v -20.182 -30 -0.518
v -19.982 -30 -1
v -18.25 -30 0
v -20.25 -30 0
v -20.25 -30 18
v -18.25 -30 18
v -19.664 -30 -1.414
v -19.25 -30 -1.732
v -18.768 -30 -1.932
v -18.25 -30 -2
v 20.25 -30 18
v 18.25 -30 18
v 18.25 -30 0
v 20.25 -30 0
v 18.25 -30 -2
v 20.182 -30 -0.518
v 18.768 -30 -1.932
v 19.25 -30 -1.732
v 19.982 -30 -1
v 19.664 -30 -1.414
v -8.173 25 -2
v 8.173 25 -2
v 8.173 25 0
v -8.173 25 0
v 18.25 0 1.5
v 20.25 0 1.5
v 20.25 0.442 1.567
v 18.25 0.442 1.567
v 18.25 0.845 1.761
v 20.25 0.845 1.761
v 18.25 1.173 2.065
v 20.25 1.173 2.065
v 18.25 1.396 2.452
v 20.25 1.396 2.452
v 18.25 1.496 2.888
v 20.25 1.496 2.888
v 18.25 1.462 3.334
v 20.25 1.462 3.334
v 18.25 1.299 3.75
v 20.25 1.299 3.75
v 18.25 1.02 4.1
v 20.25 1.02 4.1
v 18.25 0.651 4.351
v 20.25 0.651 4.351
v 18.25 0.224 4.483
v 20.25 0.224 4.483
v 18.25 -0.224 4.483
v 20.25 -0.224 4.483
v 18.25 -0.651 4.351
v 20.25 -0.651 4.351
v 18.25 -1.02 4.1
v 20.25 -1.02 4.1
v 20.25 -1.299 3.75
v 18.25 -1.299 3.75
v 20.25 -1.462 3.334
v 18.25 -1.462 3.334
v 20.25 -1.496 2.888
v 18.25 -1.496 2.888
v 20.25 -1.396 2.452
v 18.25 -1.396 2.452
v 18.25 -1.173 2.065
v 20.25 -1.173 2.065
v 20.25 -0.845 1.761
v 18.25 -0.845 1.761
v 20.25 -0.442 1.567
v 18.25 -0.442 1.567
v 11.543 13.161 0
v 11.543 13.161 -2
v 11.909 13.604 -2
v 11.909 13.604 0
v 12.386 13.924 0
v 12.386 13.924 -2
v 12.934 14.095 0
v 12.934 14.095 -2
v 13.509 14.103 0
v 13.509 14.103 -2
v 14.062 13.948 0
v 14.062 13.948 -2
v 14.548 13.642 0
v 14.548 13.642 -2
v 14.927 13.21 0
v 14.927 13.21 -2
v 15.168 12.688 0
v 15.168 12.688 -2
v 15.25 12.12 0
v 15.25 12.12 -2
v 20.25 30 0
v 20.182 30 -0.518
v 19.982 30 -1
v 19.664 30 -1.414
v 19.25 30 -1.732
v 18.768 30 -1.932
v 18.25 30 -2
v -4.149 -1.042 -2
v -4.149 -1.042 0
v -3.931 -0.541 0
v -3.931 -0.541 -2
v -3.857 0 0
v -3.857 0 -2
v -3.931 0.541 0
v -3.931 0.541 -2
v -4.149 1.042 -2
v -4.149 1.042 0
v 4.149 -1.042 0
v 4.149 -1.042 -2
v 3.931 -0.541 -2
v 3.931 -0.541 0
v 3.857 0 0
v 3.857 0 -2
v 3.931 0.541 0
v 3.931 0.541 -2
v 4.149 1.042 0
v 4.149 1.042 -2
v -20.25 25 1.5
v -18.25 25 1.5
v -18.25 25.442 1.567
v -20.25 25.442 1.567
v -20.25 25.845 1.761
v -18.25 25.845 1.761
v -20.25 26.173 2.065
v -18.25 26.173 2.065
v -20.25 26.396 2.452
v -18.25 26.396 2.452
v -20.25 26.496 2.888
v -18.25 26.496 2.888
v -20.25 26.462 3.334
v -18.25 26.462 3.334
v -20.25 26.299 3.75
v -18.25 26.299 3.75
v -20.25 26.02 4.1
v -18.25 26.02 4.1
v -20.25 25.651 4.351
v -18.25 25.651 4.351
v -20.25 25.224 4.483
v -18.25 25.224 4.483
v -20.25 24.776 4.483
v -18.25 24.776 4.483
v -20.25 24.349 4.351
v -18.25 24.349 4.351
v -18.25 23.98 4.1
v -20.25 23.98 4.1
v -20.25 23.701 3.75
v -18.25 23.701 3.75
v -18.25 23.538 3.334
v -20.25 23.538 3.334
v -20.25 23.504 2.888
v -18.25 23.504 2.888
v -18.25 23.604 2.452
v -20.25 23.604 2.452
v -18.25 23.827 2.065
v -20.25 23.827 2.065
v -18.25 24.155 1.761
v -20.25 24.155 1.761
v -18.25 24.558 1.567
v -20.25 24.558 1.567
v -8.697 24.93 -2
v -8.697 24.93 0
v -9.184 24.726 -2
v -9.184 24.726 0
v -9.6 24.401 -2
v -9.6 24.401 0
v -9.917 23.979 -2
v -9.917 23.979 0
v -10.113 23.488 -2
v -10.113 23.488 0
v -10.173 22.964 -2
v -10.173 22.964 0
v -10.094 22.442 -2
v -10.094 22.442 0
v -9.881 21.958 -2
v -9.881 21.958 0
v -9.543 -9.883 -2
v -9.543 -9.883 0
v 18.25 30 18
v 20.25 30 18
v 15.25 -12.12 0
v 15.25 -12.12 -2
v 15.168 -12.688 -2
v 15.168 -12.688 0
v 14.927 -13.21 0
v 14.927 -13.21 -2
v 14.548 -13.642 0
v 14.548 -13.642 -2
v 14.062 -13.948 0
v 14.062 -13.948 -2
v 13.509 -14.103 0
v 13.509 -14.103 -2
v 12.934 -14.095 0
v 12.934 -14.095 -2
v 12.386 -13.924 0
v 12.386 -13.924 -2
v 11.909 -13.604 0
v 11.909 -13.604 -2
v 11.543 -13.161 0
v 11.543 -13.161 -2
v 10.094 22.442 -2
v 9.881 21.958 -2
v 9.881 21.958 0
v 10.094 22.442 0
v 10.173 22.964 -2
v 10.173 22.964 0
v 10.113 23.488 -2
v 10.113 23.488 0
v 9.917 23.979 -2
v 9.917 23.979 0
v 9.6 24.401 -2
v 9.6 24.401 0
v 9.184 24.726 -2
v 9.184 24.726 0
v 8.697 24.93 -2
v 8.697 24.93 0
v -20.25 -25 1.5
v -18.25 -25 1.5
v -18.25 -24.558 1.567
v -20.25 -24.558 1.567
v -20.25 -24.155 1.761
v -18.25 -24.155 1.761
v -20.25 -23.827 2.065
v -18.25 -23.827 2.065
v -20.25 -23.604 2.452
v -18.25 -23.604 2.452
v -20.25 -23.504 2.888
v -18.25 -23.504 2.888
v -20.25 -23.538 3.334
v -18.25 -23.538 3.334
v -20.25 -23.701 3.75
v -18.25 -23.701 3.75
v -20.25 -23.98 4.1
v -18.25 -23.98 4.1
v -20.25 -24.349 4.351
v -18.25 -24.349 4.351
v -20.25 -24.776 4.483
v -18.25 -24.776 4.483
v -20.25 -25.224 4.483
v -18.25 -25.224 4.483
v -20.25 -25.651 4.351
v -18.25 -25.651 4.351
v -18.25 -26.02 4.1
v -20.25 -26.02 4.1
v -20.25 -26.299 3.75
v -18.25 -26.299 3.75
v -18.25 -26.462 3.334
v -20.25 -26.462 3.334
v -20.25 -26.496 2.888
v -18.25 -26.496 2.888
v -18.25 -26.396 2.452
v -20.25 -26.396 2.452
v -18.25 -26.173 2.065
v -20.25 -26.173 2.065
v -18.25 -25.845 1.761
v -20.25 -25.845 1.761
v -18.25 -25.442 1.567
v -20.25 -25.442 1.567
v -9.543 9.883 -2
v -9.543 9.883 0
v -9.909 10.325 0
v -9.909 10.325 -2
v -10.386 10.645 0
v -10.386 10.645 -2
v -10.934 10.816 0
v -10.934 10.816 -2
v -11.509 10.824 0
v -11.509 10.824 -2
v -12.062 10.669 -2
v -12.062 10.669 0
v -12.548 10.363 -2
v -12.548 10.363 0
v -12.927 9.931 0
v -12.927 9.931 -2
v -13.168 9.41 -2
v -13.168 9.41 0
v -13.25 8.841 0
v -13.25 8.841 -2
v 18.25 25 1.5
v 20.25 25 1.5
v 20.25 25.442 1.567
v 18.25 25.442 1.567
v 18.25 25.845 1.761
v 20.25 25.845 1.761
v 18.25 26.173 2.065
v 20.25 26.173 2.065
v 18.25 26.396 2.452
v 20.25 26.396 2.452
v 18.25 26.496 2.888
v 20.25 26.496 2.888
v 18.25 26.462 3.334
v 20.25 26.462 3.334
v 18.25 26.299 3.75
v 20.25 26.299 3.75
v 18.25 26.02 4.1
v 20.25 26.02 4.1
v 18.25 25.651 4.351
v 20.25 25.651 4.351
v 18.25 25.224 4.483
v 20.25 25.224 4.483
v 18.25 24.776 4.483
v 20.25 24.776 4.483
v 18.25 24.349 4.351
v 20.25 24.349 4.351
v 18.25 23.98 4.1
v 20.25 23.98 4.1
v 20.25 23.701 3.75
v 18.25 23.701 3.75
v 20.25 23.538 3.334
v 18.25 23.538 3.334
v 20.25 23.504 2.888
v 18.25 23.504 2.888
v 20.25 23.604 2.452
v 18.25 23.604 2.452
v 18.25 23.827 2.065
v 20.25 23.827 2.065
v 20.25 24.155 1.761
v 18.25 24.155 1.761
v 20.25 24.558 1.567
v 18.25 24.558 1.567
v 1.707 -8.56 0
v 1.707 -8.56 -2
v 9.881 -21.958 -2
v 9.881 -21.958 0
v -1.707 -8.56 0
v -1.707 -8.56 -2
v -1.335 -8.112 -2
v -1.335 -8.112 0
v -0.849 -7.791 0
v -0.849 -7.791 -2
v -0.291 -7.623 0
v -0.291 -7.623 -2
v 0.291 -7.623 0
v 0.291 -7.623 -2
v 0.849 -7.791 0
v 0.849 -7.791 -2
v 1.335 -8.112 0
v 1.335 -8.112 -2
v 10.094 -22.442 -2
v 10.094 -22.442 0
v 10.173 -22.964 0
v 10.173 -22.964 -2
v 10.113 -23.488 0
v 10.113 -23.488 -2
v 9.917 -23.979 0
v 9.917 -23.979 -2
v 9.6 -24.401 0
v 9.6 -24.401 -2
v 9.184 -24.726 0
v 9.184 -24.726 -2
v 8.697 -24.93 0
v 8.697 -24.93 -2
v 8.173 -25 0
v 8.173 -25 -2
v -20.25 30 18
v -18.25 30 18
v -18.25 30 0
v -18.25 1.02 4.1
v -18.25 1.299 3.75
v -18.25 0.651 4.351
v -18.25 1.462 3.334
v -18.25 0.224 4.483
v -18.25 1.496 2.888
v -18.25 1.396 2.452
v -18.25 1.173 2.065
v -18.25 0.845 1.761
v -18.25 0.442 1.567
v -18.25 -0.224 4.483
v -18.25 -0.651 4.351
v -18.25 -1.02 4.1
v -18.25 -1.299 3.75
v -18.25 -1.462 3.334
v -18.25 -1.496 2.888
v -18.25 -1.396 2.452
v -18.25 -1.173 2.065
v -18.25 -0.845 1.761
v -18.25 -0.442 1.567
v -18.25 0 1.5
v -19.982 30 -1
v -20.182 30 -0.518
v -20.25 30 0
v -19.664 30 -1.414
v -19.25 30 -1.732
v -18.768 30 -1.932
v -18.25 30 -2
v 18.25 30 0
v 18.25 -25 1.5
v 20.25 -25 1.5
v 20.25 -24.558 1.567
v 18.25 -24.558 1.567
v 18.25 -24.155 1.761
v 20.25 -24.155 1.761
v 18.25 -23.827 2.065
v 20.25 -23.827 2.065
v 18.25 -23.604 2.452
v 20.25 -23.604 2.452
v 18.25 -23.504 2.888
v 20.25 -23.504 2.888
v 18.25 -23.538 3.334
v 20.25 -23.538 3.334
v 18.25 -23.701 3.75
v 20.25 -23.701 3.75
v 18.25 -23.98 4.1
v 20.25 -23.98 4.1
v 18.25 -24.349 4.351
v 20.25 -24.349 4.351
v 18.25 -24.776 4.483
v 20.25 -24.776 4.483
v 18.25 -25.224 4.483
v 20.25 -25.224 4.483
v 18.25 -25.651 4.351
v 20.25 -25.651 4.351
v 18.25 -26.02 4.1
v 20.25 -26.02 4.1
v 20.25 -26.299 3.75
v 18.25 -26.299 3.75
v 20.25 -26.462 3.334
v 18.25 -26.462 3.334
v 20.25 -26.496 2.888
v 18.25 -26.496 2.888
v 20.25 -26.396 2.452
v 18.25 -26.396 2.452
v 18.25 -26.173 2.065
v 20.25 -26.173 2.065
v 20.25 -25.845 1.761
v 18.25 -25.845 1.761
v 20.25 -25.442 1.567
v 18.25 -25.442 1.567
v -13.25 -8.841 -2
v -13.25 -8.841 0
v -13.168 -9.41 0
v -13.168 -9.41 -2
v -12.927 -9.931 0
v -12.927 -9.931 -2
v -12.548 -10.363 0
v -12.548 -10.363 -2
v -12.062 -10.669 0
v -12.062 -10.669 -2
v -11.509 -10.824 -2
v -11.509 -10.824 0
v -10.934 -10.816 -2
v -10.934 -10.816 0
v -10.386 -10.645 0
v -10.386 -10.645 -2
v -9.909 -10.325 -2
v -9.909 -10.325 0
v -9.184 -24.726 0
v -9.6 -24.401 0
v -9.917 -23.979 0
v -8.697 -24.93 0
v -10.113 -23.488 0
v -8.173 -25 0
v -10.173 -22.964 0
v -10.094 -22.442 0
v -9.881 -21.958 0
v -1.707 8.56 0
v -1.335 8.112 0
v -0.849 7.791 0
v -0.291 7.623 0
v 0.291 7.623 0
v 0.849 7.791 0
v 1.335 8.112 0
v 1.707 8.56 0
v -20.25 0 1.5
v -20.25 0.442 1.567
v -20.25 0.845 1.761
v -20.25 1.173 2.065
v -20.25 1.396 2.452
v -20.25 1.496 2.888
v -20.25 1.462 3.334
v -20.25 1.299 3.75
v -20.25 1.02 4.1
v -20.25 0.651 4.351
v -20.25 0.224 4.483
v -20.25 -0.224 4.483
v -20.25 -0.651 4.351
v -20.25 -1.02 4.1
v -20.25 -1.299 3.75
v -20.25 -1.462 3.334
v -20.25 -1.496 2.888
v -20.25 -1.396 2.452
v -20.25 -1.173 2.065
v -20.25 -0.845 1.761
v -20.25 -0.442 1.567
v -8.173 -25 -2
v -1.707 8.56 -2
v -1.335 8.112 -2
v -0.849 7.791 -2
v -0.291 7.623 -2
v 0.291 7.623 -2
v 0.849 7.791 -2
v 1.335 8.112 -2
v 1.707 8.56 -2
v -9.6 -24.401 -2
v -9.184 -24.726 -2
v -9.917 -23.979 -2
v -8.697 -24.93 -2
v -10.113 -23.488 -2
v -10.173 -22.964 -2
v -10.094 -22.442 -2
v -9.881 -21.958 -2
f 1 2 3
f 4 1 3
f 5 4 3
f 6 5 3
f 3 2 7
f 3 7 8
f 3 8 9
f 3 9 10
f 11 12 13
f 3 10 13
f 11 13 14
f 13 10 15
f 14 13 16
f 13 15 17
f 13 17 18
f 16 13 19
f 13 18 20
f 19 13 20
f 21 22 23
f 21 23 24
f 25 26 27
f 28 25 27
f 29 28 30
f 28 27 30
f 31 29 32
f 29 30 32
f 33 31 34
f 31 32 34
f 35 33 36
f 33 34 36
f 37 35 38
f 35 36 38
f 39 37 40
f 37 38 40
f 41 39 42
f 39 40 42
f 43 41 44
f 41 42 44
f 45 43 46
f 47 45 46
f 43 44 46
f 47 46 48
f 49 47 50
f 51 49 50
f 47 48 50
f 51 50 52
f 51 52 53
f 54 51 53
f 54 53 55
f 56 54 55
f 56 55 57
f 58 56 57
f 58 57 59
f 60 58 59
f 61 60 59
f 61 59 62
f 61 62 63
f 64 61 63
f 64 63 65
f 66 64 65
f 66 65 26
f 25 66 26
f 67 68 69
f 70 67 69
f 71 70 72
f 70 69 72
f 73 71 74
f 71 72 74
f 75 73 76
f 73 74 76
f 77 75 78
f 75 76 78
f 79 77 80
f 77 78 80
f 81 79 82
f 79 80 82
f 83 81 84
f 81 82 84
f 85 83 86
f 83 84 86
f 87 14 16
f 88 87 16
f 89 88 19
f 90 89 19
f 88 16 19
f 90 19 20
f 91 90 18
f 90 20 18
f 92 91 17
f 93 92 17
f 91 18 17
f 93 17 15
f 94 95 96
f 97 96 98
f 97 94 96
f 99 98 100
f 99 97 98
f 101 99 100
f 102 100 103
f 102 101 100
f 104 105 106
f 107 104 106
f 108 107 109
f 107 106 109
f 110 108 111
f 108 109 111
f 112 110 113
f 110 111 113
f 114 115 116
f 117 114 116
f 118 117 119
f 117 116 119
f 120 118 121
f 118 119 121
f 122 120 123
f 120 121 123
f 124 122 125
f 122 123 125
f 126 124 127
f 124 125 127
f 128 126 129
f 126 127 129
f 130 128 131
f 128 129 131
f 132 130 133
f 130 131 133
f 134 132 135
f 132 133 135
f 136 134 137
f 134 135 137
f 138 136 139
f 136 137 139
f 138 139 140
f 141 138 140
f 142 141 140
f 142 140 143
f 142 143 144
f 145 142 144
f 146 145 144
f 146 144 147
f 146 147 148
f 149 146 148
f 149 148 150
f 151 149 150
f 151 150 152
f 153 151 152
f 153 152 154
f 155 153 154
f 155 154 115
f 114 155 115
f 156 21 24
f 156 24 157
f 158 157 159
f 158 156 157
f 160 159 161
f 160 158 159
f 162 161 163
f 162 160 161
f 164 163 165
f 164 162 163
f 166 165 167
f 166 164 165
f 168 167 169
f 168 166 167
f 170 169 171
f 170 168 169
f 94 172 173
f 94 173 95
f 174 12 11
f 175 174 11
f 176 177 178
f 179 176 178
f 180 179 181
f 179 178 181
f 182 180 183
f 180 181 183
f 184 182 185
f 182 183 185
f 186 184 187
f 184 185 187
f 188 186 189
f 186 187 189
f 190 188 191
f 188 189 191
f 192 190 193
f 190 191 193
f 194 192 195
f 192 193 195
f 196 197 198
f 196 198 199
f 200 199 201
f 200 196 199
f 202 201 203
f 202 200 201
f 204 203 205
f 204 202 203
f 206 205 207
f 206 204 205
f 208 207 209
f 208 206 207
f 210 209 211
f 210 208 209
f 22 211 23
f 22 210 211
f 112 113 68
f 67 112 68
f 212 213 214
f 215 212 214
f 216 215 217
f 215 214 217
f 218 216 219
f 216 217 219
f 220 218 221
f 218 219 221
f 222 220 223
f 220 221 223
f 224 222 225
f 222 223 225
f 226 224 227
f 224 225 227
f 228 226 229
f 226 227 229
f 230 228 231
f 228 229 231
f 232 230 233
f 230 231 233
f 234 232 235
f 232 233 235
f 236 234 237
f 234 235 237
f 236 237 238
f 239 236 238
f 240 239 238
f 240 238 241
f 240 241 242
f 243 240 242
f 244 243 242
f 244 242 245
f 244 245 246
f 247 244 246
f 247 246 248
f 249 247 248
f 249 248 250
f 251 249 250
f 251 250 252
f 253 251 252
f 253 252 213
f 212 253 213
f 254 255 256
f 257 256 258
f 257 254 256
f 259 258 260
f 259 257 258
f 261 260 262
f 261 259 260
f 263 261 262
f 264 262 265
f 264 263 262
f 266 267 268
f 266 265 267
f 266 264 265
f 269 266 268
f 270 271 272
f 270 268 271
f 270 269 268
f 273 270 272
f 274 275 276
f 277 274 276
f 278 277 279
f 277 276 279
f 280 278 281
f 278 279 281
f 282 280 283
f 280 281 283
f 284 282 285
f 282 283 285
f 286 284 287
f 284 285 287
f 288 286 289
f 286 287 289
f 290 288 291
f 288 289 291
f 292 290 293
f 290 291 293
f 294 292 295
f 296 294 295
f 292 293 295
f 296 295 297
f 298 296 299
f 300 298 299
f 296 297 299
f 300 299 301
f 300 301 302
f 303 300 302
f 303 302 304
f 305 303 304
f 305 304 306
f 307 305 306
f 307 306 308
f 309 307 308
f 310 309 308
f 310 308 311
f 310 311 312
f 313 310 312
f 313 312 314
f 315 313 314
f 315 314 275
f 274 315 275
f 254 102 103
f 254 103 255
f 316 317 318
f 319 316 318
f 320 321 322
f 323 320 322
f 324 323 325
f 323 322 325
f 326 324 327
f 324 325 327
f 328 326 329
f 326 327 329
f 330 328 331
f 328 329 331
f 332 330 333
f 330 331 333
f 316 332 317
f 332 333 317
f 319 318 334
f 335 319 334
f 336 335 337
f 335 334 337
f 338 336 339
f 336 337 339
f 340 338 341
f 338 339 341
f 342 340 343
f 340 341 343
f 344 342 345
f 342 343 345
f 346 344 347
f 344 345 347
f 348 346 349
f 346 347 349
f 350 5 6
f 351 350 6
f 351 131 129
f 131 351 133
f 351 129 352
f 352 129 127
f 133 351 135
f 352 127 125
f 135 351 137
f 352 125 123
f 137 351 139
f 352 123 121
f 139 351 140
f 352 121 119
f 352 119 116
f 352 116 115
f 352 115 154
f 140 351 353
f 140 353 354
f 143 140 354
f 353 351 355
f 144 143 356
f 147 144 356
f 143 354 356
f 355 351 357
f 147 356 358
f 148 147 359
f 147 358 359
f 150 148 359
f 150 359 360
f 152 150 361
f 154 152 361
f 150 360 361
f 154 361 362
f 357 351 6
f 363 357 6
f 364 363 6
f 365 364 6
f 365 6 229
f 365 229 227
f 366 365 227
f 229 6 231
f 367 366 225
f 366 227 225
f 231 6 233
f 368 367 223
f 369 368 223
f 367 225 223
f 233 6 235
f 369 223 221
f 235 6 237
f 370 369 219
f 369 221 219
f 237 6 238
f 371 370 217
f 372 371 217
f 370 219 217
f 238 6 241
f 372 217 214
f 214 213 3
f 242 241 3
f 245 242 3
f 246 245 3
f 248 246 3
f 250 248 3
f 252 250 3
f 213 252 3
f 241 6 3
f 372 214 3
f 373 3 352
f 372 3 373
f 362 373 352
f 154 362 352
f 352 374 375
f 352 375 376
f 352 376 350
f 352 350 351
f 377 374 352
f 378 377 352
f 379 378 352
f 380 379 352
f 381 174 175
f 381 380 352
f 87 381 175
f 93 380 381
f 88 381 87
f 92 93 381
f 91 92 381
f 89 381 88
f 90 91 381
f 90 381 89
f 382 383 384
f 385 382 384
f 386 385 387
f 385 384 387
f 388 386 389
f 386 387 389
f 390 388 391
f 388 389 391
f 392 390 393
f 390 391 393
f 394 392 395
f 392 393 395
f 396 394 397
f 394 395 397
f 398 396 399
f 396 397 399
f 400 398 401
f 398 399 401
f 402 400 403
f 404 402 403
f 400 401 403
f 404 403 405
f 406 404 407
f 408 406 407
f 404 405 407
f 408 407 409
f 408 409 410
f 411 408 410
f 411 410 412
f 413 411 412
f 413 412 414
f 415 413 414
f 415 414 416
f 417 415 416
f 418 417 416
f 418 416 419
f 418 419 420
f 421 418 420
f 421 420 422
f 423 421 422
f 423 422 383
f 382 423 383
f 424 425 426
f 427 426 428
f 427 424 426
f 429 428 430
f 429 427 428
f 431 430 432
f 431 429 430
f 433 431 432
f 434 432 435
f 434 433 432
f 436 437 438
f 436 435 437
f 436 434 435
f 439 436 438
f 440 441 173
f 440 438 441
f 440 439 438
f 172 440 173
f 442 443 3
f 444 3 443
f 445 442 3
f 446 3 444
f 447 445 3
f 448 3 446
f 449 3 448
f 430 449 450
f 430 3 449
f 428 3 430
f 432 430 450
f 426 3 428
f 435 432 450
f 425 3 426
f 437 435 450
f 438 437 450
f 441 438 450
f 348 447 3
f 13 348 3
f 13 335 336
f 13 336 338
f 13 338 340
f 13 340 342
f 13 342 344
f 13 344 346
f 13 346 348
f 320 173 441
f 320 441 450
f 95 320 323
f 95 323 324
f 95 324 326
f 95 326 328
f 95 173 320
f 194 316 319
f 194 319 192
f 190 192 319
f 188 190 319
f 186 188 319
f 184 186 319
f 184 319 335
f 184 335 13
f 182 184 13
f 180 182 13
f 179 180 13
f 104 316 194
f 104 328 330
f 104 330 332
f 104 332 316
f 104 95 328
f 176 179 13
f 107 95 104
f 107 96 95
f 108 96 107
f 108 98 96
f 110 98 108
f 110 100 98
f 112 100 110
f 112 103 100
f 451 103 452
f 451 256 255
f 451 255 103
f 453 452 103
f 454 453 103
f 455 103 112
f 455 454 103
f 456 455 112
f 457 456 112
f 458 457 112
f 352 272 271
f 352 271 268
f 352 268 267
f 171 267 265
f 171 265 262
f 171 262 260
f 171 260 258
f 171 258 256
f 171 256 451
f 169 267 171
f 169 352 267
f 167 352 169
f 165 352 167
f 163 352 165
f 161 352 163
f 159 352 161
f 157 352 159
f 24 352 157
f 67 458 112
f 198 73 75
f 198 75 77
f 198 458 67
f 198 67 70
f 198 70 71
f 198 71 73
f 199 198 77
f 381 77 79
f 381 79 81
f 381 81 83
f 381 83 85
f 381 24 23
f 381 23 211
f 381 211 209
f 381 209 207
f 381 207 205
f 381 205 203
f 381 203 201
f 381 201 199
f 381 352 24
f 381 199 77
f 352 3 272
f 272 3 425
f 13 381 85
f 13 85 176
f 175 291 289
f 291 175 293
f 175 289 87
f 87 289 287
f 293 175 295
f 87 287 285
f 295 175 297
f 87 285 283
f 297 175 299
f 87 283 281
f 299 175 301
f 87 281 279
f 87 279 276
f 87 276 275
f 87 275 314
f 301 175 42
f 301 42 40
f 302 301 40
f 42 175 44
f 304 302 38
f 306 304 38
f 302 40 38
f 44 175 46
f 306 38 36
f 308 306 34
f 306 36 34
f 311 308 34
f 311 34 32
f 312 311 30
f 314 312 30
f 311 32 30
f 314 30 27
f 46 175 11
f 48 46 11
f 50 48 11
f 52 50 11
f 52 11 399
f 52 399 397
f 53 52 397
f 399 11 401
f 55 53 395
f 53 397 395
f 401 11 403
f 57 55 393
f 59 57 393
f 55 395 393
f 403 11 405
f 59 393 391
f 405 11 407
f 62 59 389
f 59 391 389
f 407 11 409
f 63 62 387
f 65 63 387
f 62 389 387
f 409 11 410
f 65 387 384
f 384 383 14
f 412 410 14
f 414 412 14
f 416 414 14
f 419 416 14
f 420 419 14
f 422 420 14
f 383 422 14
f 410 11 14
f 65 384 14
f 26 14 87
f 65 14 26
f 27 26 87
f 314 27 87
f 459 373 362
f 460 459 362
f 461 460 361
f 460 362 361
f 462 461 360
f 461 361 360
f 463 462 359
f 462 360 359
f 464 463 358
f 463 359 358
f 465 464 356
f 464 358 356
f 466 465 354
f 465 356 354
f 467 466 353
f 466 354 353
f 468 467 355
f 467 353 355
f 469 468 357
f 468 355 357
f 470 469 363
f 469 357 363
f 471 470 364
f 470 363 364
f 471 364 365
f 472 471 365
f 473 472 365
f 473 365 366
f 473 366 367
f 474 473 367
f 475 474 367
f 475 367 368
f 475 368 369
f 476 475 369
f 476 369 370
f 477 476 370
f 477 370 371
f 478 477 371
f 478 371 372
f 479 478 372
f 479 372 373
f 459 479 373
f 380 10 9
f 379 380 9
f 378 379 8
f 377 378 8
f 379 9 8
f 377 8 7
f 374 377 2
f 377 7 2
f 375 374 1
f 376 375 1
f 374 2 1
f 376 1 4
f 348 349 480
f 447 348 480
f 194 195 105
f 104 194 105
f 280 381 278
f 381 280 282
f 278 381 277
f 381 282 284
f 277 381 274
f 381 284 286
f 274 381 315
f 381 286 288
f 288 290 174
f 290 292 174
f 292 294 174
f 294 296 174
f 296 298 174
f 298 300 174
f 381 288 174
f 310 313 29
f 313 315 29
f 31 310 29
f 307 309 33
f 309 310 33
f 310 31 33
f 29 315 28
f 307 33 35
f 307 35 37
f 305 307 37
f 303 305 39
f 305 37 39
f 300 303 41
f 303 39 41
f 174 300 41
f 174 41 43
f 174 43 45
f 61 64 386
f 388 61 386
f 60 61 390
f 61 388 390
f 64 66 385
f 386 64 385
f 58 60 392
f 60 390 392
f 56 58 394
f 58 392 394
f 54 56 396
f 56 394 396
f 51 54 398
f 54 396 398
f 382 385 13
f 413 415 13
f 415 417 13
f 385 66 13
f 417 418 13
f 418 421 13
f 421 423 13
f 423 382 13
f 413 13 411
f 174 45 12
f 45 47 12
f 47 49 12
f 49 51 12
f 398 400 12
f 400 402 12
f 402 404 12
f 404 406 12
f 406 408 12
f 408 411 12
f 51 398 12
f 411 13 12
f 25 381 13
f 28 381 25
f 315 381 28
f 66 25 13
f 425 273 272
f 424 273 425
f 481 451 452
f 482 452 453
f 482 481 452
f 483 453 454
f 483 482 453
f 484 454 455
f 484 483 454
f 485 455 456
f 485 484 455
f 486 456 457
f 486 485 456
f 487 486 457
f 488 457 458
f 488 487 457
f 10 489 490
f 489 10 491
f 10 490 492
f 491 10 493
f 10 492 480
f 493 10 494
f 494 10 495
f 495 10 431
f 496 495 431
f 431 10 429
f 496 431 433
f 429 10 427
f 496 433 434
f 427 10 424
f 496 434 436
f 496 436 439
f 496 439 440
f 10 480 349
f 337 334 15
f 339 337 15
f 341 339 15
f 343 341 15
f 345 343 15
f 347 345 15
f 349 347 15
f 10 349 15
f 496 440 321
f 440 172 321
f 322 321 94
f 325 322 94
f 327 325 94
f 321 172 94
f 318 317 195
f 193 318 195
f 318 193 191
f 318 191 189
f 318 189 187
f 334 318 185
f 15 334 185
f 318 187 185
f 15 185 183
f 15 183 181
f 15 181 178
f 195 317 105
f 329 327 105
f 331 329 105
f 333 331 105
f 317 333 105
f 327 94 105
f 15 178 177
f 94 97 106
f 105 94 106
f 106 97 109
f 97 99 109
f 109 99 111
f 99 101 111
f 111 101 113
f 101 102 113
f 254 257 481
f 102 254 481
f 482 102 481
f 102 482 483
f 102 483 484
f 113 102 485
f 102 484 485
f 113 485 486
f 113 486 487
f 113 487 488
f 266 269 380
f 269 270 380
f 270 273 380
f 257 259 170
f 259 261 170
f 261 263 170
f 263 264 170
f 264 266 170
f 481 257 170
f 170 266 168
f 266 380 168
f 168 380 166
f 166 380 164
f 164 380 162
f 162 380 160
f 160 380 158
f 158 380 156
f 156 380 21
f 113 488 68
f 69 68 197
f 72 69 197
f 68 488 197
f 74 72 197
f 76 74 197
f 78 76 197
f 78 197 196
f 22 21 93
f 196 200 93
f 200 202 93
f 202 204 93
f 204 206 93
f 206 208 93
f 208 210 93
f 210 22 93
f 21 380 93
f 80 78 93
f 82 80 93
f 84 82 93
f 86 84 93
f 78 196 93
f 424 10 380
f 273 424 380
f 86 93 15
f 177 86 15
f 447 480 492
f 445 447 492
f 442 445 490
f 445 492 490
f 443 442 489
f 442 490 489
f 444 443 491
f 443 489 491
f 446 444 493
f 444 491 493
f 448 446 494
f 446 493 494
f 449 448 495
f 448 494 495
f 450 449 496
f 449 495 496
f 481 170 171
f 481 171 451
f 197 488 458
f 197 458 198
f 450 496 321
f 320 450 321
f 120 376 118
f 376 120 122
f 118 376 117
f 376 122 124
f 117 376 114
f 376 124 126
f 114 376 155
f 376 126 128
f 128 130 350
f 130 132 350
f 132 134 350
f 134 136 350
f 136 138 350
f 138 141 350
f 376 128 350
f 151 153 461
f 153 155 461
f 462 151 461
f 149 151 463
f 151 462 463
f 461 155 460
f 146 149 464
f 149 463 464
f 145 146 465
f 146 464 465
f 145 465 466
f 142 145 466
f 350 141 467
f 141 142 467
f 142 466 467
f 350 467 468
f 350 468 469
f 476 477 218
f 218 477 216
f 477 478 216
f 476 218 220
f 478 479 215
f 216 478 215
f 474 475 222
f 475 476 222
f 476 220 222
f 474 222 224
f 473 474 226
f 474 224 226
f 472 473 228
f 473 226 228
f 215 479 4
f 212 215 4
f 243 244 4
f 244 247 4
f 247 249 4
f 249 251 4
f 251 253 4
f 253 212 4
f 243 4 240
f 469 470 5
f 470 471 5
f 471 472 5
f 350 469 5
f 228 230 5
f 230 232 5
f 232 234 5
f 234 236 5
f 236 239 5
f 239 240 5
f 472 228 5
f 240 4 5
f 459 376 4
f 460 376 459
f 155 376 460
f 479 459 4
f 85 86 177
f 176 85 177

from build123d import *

# Parameters (mm, degrees)
SKETCH_1_W             = 36.5
SKETCH_1_H             = 60
SM_BASE_FLANGE_1_DEPTH = 2
SM_START               = -30
SM_EDGE_FLANGE_1_DEPTH = 60
CUT_EXTRUDE_1_DEPTH    = 10
SKETCH_17_R            = 1.5
CUT_EXTRUDE_2_DEPTH    = 54.518688325


# Read off the part's stored shape, not the designer's step: 邊線-凸緣1
# Sheet-metal steps are written as plain solids
with BuildPart() as part:
    # Sketch 1 → 基材-凸緣1 (new body)
    with BuildSketch(Plane.XY):
        Rectangle(SKETCH_1_W, SKETCH_1_H)
    extrude(amount=-SM_BASE_FLANGE_1_DEPTH)

    # 邊線-凸緣1 outline → 邊線-凸緣1 (add)
    with BuildSketch(Plane(origin=(0, 0, 0), x_dir=(1, 0, 0), z_dir=(0, 1, 0)).offset(SM_START)):
        with BuildLine():
            ThreePointArc((20.25, 0), (19.664213562, 1.414213562), (18.25, 2))
            Line((18.25, 2), (18.25, -18))
            Line((18.25, -18), (20.25, -18))
            Line((20.25, -18), (20.25, 0))
        make_face()
        with BuildLine():
            Line((-20.25, 0), (-20.25, -18))
            Line((-20.25, -18), (-18.25, -18))
            Line((-18.25, -18), (-18.25, 2))
            ThreePointArc((-18.25, 2), (-19.664213562, 1.414213562), (-20.25, 0))
        make_face()
    extrude(amount=SM_EDGE_FLANGE_1_DEPTH)

    # 草圖14 → 除料-伸長1 (cut)
    with BuildSketch(Plane(origin=(0, 0, -2), x_dir=(-1, 0, 0), z_dir=(0, 0, -1))):
        with BuildLine():
            Line((-8.173166384, 25), (8.173166384, 25))
            ThreePointArc((8.173166384, 25), (9.91716134, 23.979020733), (9.880573604, 21.958481596))
            Line((9.880573604, 21.958481596), (1.70740722, 8.559848179))
            ThreePointArc((1.70740722, 8.559848179), (0, 7.601366583), (-1.70740722, 8.559848179))
            Line((-1.70740722, 8.559848179), (-9.880573604, 21.958481596))
            ThreePointArc((-9.880573604, 21.958481596), (-9.91716134, 23.979020733), (-8.173166384, 25))
        make_face()
        with BuildLine():
            Line((-15.25, 12.119944893), (-15.25, -12.119944893))
            ThreePointArc((-15.25, -12.119944893), (-13.79091846, -14.045407751), (-11.54259278, -13.161463297))
            Line((-11.54259278, -13.161463297), (-4.149426396, -1.041518404))
            ThreePointArc((-4.149426396, -1.041518404), (-3.856833616, 0), (-4.149426396, 1.041518404))
            Line((-4.149426396, 1.041518404), (-11.54259278, 13.161463297))
            ThreePointArc((-11.54259278, 13.161463297), (-13.79091846, 14.045407751), (-15.25, 12.119944893))
        make_face()
        with BuildLine():
            Line((-8.173166384, -25), (8.173166384, -25))
            ThreePointArc((8.173166384, -25), (9.91716134, -23.979020733), (9.880573604, -21.958481596))
            Line((9.880573604, -21.958481596), (1.70740722, -8.559848179))
            ThreePointArc((1.70740722, -8.559848179), (0, -7.601366583), (-1.70740722, -8.559848179))
            Line((-1.70740722, -8.559848179), (-9.880573604, -21.958481596))
            ThreePointArc((-9.880573604, -21.958481596), (-9.91716134, -23.979020733), (-8.173166384, -25))
        make_face()
        with BuildLine():
            Line((13.25, 8.841256368), (13.25, -8.841256368))
            ThreePointArc((13.25, -8.841256368), (11.79091846, -10.766719227), (9.54259278, -9.882774772))
            Line((9.54259278, -9.882774772), (4.149426396, -1.041518404))
            ThreePointArc((4.149426396, -1.041518404), (3.856833616, 0), (4.149426396, 1.041518404))
            Line((4.149426396, 1.041518404), (9.54259278, 9.882774772))
            ThreePointArc((9.54259278, 9.882774772), (11.79091846, 10.766719227), (13.25, 8.841256368))
        make_face()
    extrude(amount=-CUT_EXTRUDE_1_DEPTH, mode=Mode.SUBTRACT)

    # 草圖17 → 除料-伸長2 (cut, through all)
    with BuildSketch(Plane(origin=(20.25, 0, 0), x_dir=(0, 0, -1), z_dir=(1, 0, 0))):
        with Locations((-3, 25)):
            Circle(SKETCH_17_R)
        with Locations((-3, -25)):
            Circle(SKETCH_17_R)
        with Locations((-3, 0)):
            Circle(SKETCH_17_R)
    extrude(amount=-CUT_EXTRUDE_2_DEPTH, mode=Mode.SUBTRACT)


solid = part.part
